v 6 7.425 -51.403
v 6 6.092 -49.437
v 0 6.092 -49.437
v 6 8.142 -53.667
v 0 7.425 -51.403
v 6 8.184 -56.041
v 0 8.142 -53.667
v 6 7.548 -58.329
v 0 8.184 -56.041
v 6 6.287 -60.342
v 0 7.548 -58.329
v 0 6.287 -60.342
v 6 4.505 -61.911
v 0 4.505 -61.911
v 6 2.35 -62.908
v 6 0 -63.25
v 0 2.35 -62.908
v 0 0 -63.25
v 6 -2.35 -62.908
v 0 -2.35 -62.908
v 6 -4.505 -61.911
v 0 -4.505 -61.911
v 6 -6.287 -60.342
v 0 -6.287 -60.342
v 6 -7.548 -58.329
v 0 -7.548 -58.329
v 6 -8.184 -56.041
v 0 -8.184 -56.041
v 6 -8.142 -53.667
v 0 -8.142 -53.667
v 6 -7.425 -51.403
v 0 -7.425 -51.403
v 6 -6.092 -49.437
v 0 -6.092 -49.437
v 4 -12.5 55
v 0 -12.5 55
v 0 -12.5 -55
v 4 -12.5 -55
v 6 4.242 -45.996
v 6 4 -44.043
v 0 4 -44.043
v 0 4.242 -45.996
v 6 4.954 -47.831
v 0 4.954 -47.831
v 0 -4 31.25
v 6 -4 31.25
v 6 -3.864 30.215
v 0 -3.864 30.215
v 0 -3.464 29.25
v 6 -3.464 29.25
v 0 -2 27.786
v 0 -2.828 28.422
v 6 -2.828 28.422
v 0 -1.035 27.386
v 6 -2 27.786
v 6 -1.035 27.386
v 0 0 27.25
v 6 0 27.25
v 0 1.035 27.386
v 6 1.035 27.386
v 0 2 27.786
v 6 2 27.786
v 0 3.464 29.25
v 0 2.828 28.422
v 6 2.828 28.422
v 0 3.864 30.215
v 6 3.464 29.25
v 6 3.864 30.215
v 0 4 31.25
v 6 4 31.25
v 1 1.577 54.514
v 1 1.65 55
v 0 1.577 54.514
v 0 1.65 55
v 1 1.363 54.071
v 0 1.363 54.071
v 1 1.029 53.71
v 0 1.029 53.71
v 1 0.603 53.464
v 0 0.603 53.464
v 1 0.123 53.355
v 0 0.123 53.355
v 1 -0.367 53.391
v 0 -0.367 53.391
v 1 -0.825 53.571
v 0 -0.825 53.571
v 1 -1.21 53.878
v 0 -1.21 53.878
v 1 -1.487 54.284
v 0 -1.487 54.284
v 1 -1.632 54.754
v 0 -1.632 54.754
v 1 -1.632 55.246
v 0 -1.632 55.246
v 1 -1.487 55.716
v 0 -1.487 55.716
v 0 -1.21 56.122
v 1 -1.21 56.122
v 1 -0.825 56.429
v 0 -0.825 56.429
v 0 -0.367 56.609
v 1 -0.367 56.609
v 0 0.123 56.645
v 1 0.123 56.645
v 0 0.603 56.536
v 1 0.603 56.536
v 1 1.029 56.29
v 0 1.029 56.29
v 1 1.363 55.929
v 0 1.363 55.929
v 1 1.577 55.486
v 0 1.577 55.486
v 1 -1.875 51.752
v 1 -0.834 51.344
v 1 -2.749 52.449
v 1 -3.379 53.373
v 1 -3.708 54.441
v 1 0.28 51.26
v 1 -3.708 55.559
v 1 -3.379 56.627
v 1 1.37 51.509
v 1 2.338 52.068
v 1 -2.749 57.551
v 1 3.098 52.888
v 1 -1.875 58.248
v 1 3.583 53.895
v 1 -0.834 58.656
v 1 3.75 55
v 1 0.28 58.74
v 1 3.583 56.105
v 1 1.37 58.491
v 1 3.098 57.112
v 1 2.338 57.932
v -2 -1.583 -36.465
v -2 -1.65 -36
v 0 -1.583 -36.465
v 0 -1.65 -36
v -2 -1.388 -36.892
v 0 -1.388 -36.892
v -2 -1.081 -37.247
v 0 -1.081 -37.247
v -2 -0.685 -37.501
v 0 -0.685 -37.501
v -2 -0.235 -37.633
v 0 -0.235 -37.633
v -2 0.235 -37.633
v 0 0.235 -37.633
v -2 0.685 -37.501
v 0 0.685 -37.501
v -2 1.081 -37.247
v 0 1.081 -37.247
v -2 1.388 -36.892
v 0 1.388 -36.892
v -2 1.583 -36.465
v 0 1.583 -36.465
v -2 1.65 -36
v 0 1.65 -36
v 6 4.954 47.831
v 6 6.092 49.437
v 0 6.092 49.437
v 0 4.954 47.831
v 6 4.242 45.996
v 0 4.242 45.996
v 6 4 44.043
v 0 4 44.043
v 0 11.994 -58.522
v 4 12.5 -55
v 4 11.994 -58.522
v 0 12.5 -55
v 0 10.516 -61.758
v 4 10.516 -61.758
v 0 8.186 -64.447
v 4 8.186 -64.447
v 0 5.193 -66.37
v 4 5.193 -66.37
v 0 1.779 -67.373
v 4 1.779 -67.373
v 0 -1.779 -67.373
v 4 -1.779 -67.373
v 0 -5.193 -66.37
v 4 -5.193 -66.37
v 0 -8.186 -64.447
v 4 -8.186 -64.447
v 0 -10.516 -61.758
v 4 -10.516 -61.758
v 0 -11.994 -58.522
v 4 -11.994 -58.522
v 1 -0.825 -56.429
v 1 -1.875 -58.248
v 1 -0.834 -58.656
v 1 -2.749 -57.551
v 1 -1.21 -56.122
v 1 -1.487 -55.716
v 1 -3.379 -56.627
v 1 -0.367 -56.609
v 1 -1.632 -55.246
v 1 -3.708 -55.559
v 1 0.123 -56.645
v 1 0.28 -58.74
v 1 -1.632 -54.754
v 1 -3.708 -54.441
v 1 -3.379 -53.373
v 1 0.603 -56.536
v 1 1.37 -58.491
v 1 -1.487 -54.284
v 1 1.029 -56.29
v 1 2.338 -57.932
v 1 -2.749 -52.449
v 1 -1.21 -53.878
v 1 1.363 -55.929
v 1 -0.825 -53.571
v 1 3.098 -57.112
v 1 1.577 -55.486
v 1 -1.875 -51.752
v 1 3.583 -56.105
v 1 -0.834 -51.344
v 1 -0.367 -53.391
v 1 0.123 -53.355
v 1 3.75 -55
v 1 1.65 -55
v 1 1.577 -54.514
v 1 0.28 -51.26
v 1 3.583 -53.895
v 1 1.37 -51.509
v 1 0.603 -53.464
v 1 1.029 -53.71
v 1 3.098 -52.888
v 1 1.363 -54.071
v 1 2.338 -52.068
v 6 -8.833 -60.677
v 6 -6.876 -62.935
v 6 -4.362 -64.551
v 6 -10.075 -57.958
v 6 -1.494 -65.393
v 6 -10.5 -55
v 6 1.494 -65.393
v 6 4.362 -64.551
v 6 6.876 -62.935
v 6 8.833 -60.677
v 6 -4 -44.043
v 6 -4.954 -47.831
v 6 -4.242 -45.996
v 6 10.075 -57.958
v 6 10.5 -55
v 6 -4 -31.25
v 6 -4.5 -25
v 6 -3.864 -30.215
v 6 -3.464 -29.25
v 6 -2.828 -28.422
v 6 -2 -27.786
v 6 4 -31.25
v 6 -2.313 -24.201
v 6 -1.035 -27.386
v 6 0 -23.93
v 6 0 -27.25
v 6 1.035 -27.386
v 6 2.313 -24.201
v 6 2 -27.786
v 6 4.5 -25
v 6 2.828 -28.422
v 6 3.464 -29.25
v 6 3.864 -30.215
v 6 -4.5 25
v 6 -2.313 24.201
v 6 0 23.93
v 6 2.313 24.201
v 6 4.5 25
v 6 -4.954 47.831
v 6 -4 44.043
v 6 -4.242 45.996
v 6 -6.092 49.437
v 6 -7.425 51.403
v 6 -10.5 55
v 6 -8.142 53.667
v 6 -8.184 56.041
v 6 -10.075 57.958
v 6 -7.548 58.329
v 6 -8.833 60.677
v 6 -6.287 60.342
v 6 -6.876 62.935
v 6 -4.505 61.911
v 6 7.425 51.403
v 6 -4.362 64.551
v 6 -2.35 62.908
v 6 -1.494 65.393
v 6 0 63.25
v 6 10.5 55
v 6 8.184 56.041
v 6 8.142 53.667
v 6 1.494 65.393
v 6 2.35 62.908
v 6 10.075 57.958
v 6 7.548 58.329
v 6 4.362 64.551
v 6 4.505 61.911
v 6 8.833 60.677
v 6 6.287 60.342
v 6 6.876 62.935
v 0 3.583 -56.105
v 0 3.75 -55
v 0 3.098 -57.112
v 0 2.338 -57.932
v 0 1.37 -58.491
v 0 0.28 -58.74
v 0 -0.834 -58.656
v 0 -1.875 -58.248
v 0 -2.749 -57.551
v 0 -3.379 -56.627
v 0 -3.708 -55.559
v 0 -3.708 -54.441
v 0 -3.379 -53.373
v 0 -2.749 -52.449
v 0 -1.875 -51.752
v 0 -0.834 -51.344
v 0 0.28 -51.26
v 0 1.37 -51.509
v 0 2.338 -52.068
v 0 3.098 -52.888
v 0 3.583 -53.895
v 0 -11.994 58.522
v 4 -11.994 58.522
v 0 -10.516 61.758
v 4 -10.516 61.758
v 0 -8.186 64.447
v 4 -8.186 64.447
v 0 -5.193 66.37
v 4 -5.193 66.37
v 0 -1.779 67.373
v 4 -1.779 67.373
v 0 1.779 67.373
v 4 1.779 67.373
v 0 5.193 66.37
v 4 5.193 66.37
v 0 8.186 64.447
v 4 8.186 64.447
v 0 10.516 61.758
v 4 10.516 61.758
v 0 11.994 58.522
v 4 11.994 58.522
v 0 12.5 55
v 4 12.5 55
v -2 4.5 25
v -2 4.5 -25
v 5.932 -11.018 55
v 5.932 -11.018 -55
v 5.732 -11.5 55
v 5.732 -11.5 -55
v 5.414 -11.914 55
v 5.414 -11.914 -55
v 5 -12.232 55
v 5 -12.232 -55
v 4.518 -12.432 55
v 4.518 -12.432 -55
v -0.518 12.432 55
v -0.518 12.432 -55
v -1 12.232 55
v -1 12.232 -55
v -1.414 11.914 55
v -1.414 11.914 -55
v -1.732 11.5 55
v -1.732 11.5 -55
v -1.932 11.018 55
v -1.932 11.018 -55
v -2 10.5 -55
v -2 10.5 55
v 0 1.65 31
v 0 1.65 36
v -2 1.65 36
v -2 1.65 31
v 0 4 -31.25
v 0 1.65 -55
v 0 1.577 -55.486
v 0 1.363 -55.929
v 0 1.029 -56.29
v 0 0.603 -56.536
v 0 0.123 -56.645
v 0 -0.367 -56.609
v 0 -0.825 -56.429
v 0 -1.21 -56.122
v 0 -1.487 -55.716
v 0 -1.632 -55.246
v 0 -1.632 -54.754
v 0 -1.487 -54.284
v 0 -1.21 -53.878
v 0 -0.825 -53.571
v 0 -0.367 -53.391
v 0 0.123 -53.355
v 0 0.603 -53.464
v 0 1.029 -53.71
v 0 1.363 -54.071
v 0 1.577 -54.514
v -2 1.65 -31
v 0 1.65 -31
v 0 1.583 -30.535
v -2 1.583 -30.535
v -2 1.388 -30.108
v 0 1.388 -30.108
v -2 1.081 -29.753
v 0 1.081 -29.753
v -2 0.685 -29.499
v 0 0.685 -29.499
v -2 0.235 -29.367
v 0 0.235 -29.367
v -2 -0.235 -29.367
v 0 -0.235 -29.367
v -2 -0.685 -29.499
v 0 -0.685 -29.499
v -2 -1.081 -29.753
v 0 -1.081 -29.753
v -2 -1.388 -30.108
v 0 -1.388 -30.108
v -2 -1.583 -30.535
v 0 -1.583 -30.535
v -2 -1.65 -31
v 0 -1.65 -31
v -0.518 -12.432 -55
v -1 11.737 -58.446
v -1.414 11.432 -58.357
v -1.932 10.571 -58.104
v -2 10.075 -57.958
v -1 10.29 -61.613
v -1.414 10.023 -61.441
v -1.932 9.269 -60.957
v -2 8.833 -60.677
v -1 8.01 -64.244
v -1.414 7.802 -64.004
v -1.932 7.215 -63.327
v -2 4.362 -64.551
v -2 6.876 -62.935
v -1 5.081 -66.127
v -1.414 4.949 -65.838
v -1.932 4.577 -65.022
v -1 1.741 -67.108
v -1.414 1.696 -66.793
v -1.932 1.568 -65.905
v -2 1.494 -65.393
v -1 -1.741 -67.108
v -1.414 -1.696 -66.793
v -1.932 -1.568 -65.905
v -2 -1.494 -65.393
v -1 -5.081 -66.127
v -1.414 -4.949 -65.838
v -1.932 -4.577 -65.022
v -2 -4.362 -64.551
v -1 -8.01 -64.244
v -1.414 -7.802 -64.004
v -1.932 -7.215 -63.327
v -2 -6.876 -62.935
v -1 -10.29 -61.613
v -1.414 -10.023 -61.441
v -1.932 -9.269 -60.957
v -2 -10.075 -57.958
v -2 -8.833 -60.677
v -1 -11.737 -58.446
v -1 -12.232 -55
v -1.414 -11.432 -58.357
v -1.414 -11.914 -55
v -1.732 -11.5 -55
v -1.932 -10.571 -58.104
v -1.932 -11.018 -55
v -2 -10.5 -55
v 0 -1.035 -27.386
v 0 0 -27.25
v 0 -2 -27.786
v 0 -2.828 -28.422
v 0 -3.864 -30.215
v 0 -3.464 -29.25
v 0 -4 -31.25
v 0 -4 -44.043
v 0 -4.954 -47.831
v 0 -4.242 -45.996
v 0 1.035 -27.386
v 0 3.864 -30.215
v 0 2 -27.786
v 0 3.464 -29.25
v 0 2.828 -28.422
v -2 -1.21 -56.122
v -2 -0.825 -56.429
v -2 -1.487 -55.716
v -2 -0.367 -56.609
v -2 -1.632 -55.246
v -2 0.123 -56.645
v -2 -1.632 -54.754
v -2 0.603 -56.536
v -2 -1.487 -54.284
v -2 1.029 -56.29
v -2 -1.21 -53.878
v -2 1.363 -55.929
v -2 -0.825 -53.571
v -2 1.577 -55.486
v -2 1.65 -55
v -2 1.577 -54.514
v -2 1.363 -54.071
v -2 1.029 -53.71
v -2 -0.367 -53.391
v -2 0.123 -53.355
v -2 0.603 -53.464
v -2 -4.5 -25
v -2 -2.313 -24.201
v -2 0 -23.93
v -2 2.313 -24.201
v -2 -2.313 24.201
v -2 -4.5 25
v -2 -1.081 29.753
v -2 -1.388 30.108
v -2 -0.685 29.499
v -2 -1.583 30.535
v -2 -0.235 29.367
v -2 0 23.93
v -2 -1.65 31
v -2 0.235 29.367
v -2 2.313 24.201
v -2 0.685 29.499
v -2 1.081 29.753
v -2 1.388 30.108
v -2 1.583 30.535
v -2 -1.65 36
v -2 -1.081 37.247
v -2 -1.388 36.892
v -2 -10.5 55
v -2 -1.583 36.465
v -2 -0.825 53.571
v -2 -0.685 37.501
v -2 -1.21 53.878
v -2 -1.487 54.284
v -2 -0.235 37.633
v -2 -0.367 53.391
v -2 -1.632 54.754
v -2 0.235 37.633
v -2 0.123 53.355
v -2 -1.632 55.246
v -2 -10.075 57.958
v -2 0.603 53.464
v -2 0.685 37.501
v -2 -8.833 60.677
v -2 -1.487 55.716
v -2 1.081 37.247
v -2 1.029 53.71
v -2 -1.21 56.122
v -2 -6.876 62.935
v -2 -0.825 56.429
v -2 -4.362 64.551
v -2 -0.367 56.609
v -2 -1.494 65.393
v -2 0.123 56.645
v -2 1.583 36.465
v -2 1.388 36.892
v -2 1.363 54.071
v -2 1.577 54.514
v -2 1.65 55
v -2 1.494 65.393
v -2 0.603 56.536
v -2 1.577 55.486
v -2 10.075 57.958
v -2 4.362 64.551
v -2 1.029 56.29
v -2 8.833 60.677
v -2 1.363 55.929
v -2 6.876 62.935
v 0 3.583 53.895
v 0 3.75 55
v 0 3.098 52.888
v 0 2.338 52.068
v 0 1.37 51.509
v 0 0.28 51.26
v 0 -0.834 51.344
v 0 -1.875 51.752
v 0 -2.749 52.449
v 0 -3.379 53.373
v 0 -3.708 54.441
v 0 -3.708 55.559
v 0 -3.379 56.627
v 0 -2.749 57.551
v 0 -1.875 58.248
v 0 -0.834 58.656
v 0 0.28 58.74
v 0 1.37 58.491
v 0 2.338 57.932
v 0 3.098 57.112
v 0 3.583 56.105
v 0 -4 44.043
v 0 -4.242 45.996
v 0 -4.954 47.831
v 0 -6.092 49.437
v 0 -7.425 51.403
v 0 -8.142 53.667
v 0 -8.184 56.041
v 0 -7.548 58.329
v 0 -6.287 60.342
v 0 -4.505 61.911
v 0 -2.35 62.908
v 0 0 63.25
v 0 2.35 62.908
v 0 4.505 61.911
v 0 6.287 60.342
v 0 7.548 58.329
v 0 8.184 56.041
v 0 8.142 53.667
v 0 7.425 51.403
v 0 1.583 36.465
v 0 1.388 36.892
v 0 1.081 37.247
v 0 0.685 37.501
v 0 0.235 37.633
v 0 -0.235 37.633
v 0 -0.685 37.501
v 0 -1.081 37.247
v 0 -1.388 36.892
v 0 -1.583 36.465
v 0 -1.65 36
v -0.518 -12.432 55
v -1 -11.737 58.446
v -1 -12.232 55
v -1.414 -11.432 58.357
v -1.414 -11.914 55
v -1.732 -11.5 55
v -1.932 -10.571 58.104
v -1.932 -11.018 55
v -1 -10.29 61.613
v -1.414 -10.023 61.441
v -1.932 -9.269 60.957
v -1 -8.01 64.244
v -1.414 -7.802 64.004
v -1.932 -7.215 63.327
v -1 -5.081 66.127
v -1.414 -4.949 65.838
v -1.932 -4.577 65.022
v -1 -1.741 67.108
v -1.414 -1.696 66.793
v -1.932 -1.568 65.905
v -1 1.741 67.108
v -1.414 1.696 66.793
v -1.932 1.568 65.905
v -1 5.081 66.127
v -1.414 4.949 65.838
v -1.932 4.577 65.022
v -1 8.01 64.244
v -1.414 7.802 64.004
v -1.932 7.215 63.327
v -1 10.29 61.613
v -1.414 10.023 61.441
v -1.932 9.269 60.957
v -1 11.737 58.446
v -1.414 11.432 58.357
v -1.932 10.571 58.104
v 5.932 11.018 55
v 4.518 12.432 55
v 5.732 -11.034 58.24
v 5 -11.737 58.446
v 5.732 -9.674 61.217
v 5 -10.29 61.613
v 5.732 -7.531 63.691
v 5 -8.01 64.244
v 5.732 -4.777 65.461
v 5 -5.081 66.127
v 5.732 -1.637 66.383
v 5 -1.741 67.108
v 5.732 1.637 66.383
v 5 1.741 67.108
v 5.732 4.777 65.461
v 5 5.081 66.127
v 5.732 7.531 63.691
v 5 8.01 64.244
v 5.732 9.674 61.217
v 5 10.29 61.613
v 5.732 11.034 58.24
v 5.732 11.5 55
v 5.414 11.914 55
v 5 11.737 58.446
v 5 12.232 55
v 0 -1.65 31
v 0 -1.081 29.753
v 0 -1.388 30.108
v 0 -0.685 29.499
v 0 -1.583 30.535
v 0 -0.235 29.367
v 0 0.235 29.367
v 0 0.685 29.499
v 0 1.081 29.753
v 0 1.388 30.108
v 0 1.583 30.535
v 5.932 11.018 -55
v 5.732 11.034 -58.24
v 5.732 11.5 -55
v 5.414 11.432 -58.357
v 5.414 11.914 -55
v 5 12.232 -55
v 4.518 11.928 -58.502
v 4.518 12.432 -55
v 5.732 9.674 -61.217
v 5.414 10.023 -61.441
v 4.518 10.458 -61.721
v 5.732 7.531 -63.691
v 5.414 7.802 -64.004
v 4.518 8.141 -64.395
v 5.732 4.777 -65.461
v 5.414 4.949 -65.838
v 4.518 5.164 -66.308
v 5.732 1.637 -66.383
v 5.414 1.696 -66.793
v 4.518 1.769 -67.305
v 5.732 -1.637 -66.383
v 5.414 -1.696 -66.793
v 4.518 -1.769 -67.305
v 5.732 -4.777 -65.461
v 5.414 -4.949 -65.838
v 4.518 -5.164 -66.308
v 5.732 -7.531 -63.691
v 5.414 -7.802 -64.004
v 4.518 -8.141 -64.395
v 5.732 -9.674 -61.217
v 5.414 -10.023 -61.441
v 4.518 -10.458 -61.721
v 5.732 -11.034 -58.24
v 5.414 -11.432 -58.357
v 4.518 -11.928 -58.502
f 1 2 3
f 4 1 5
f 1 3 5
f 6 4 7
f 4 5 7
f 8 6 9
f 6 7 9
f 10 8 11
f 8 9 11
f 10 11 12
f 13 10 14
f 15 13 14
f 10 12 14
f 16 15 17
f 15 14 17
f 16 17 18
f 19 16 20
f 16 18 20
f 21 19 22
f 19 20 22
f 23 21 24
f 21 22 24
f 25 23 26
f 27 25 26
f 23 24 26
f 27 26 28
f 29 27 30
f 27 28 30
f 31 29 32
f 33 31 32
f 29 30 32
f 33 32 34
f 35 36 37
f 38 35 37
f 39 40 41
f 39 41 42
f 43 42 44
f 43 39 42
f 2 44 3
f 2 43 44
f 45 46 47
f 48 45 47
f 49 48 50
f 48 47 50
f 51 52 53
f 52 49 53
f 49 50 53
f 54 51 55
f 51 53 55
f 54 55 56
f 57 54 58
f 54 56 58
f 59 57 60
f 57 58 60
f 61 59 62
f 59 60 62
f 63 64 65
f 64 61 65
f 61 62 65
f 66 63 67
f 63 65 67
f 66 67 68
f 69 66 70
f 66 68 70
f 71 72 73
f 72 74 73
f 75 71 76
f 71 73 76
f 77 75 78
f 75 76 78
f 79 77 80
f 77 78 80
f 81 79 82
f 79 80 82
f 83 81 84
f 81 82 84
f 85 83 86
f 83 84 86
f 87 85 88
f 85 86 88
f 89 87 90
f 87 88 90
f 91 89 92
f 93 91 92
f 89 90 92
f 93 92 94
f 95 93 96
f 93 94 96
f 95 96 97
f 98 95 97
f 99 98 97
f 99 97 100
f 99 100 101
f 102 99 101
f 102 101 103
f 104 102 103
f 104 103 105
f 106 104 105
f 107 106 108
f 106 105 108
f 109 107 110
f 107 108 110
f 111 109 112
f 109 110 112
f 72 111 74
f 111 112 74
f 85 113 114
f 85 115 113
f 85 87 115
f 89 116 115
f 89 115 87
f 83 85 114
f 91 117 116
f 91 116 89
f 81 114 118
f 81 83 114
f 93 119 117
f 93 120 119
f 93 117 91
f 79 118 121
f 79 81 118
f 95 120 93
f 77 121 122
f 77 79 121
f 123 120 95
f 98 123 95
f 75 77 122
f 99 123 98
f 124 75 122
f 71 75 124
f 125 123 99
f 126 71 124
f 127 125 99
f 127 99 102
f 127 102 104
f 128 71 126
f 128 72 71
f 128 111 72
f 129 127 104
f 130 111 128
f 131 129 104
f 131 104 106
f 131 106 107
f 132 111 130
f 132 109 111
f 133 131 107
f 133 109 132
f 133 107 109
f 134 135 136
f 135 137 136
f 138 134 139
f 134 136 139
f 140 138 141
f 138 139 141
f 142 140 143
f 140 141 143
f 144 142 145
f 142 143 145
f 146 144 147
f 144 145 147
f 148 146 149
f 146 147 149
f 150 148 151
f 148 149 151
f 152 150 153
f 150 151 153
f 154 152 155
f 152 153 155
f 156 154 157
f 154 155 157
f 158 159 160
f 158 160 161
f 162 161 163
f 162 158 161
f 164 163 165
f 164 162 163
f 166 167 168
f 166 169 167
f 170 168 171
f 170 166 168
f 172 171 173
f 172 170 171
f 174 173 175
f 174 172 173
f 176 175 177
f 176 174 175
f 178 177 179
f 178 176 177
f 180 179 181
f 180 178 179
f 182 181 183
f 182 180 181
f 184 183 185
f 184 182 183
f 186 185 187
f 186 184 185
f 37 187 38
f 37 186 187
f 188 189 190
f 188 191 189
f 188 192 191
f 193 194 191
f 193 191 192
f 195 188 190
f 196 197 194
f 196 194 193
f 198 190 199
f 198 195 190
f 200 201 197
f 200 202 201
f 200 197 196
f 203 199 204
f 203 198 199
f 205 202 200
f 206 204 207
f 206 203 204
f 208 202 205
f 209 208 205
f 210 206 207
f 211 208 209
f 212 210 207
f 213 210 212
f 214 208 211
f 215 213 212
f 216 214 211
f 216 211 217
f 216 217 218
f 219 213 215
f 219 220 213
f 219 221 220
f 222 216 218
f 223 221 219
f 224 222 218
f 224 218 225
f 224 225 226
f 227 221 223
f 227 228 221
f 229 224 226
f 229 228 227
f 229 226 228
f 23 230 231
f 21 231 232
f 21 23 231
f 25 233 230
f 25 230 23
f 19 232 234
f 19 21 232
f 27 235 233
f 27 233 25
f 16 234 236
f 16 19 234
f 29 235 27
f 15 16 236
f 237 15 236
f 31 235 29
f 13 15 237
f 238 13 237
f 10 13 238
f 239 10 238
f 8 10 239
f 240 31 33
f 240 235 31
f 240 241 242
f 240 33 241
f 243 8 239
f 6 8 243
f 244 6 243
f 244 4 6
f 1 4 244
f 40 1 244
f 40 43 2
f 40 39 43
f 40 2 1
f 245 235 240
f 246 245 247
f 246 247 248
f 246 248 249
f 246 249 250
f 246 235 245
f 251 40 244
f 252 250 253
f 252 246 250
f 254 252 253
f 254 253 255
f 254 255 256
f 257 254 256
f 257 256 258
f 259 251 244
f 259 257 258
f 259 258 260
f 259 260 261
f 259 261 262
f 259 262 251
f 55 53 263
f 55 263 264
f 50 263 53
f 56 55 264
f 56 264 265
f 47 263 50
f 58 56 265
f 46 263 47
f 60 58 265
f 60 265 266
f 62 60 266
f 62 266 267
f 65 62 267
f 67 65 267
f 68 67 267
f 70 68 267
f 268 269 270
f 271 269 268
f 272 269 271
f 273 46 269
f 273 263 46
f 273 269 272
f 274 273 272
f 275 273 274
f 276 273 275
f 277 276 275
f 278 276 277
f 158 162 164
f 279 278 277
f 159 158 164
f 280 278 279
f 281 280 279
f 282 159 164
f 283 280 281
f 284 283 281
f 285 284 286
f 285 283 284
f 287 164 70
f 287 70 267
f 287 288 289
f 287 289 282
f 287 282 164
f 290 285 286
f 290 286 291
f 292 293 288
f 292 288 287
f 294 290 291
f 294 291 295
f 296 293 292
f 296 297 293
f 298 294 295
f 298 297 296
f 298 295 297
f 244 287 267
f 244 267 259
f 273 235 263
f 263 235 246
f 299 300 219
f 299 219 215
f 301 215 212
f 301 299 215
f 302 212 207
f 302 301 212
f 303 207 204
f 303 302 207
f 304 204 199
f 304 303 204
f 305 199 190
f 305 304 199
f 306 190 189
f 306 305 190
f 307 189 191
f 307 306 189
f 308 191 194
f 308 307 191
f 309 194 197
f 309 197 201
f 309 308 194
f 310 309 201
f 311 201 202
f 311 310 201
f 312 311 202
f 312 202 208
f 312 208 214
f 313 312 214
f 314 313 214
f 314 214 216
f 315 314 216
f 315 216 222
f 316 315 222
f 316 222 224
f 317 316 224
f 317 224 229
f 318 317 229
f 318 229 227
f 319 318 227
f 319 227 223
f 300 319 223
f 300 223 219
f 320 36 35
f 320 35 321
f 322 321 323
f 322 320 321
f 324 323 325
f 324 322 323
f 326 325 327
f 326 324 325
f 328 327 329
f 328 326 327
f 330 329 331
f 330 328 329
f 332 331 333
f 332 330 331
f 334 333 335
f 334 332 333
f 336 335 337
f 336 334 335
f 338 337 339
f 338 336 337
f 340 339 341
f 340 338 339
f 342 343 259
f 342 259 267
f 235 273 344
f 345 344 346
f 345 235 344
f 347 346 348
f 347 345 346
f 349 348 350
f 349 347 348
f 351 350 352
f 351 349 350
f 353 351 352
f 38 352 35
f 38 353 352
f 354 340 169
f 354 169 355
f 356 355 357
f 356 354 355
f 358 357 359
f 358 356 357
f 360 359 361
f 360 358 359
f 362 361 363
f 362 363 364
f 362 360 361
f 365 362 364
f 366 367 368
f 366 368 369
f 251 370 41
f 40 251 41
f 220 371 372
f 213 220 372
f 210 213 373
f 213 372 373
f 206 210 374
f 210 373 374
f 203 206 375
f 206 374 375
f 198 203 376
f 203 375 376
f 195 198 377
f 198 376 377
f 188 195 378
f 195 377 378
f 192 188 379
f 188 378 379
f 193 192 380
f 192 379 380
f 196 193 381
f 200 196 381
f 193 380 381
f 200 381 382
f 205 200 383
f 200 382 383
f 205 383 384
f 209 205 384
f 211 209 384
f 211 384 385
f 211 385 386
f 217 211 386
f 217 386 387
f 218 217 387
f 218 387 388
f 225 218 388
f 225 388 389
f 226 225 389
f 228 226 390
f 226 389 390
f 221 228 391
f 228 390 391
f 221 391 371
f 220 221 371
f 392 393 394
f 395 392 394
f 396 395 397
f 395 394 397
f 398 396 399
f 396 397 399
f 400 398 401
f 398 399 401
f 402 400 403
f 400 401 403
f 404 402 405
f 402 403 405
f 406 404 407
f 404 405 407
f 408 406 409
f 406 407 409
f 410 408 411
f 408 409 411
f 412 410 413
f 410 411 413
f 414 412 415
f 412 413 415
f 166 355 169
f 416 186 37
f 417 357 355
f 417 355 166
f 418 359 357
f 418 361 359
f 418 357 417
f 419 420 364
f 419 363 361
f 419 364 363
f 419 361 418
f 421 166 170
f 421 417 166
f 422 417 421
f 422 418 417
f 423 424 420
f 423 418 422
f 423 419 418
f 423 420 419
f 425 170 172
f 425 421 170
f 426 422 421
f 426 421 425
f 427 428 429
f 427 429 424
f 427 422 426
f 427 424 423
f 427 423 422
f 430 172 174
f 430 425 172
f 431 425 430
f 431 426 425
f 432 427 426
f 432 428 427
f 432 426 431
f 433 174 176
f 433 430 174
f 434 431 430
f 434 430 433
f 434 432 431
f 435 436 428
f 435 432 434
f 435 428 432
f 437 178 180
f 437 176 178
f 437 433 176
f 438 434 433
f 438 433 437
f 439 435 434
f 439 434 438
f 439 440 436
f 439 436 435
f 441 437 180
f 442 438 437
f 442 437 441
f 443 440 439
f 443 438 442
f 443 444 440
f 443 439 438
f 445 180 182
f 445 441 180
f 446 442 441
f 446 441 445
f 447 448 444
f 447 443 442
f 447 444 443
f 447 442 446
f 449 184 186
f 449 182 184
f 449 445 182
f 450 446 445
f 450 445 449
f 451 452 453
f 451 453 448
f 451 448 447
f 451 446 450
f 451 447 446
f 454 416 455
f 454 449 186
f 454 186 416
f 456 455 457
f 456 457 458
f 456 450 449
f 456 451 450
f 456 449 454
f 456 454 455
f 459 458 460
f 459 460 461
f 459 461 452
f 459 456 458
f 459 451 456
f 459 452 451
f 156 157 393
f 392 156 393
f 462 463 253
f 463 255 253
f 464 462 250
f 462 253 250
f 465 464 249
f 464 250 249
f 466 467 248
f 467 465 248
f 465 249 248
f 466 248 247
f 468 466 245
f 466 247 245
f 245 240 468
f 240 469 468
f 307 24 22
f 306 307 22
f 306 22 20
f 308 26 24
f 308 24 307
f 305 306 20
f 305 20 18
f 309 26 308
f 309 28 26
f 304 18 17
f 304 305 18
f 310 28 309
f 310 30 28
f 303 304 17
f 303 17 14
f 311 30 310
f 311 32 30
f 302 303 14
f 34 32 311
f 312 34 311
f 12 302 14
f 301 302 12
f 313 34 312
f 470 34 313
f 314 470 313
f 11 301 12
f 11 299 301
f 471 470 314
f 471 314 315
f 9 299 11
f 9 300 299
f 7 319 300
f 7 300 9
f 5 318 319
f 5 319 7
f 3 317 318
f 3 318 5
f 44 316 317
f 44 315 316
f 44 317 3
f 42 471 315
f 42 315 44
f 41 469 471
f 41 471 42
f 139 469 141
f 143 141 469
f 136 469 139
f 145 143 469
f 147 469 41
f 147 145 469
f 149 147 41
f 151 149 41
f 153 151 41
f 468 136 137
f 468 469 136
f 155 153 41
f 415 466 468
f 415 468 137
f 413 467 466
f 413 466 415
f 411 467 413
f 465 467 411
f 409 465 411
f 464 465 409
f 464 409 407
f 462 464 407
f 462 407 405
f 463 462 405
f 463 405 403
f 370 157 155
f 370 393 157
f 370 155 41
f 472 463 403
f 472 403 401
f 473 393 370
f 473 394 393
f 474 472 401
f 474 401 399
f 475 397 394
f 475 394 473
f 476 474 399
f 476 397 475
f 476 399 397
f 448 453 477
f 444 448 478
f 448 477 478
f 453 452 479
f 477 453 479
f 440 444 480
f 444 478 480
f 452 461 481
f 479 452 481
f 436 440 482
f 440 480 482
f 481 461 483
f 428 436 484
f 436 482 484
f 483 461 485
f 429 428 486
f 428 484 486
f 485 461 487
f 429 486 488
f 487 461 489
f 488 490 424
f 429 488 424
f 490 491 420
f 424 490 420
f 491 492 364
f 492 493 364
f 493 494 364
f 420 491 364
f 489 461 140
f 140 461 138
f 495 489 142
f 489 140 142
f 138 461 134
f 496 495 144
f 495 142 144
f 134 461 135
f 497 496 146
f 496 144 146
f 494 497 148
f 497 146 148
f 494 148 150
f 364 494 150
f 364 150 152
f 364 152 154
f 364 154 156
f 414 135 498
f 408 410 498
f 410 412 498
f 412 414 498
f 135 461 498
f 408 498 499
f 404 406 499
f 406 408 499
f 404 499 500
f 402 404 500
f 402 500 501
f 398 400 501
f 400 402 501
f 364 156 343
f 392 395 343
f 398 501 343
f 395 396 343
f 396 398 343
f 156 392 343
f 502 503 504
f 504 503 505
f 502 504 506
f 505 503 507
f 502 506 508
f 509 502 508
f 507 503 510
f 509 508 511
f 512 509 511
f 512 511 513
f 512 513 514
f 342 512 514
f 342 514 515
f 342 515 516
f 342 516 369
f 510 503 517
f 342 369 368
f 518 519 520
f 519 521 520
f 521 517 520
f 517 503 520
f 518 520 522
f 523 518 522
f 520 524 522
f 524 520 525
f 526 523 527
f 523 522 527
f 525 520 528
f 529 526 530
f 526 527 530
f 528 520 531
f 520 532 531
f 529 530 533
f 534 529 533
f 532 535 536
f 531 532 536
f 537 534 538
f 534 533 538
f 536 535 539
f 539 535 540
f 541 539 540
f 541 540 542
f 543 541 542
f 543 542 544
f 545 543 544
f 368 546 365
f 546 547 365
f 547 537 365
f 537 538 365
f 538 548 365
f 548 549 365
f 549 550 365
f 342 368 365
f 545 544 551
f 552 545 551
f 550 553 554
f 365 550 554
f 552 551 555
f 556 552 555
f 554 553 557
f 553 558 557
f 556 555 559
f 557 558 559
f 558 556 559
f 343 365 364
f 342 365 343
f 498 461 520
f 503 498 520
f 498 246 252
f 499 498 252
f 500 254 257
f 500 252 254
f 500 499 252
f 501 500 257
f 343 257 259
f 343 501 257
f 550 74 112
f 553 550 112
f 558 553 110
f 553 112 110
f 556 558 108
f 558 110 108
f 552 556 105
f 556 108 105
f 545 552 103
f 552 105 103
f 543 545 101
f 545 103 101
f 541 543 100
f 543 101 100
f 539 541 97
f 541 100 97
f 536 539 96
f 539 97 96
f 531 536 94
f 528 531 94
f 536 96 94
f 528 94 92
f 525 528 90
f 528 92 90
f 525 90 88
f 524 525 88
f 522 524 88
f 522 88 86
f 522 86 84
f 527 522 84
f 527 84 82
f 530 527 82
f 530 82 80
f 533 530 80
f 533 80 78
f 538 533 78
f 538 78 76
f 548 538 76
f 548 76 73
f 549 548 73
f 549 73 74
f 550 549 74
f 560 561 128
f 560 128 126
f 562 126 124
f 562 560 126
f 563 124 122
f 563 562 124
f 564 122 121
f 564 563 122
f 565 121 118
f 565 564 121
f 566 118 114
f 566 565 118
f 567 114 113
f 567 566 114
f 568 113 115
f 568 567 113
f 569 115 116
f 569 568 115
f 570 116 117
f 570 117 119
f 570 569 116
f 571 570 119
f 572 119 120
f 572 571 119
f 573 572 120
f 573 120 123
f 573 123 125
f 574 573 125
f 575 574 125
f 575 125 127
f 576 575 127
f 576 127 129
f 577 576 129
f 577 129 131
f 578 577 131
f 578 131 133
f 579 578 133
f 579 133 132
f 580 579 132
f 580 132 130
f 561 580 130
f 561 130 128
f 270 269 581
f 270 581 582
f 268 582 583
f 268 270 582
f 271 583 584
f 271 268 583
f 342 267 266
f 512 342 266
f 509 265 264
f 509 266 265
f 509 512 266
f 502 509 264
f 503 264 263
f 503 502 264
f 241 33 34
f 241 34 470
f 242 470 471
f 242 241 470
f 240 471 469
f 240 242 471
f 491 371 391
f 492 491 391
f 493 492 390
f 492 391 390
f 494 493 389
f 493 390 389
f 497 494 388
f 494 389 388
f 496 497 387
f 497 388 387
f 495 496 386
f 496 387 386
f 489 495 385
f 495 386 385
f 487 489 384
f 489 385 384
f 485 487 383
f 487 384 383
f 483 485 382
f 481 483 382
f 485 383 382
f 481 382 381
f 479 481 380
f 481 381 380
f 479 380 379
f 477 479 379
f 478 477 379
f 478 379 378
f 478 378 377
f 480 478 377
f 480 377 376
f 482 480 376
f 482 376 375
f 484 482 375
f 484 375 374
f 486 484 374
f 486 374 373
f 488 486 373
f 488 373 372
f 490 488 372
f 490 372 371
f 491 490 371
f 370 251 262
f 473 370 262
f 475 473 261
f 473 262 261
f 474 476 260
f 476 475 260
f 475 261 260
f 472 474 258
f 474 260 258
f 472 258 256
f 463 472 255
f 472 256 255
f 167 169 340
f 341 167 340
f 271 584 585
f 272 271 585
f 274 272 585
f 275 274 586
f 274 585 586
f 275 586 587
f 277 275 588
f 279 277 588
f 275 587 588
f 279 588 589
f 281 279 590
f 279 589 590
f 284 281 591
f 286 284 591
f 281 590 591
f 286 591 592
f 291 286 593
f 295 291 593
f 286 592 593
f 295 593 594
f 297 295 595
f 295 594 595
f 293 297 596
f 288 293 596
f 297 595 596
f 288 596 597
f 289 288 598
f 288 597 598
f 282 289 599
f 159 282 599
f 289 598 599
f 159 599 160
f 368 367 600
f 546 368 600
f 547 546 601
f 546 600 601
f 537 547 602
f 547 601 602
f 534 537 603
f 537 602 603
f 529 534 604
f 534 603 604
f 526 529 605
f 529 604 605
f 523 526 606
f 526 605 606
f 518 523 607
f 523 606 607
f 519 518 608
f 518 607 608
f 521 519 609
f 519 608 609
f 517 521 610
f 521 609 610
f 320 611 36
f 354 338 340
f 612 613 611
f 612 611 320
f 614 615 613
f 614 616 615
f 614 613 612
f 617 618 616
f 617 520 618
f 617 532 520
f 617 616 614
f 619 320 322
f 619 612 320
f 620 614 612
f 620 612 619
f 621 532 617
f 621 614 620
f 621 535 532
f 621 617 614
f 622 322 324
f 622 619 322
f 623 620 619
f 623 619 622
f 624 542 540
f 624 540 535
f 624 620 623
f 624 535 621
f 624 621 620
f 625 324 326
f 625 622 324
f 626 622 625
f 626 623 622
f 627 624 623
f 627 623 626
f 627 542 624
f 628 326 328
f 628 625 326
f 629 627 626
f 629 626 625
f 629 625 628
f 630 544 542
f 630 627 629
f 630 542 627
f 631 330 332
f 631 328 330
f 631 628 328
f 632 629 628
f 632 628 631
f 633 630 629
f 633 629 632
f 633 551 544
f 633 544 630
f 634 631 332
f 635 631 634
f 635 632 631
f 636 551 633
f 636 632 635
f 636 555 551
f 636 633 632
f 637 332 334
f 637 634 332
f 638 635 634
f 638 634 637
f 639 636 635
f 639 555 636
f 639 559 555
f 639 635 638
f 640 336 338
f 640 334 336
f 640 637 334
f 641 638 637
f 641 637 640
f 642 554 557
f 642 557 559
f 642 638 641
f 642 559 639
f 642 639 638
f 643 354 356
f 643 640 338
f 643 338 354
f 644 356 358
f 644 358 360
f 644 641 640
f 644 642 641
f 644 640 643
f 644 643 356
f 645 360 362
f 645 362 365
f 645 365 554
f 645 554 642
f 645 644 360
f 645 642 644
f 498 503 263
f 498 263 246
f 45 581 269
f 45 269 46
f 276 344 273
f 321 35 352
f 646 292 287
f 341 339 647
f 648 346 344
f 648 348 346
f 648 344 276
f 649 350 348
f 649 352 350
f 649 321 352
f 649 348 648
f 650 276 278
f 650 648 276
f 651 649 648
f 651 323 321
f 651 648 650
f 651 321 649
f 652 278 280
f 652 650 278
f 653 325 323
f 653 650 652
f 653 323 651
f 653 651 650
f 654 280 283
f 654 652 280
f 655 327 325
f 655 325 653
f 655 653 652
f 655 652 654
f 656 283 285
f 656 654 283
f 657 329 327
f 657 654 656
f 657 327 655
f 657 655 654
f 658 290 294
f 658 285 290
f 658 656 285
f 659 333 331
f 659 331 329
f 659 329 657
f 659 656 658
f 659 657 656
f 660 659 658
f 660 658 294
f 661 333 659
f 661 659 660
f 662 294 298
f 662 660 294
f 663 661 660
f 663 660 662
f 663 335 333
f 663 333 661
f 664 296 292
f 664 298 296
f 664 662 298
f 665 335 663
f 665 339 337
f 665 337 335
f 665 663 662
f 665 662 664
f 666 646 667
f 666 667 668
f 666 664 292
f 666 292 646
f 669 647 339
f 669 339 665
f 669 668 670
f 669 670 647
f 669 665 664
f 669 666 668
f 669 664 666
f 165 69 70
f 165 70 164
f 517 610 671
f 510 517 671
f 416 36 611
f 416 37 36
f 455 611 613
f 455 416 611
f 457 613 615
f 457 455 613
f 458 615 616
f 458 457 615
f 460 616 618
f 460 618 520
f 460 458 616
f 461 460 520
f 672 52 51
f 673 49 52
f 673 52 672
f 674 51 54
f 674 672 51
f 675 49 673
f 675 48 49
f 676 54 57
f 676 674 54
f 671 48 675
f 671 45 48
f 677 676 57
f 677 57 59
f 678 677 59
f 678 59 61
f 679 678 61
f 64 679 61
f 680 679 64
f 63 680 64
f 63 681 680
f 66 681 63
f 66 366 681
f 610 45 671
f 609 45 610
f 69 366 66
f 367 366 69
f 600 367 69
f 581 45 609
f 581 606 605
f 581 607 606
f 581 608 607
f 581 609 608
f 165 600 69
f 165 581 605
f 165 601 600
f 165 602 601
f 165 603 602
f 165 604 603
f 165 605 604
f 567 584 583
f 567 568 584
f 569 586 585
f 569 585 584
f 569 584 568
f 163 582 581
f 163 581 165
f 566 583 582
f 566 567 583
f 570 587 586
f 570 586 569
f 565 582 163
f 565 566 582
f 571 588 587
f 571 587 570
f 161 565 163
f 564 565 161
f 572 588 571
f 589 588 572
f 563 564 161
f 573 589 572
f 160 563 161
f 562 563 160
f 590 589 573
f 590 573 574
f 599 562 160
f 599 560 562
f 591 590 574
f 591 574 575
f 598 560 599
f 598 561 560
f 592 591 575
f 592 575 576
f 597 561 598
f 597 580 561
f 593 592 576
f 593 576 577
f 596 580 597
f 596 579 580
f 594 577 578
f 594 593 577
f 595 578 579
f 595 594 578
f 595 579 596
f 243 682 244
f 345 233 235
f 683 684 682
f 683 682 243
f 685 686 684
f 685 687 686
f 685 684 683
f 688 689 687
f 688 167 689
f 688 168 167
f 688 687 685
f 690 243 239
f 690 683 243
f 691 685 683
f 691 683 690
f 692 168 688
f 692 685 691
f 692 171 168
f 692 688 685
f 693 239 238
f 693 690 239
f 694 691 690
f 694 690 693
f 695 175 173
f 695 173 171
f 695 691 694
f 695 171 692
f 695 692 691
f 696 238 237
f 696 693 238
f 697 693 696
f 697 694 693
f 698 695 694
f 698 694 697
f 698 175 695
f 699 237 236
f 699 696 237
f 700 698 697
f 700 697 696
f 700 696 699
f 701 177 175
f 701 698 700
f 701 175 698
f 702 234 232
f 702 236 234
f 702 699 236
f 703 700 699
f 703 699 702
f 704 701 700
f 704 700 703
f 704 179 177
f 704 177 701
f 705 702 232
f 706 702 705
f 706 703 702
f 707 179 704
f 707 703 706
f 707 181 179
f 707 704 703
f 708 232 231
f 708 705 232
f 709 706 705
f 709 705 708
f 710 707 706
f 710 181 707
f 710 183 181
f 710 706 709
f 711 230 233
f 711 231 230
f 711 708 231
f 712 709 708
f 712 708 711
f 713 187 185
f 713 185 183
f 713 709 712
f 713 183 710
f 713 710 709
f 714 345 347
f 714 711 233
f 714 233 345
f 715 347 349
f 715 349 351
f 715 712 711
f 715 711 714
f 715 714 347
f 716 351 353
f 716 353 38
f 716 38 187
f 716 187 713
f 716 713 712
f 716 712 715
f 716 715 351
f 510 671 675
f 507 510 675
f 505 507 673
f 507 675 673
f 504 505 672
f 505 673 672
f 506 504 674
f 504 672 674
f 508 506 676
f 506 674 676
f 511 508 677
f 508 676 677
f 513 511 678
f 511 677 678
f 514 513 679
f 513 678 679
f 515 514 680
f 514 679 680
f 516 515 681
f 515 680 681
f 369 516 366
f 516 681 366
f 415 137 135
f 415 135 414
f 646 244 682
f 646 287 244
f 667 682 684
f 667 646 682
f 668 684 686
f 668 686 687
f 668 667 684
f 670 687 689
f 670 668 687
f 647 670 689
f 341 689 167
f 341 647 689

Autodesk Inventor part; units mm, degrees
ref_plane "YZ Plane" through (0, 0, 0) normal (1, 0, 0) x (0, 1, 0)
ref_plane "XZ Plane" through (0, 0, 0) normal (0, 1, 0) x (-1, 0, 0)
ref_plane "XY Plane" through (0, 0, 0) normal (0, 0, 1) x (1, 0, 0)
sketch "Sketch1" plane through (0, 0, 0) normal (1, 0, 0) x (0, 1, 0)
  line L0 (12.5, 55) -> (-12.5, 55)
  line L1 (-12.5, 55) -> (-12.5, -55)
  line L2 (-12.5, -55) -> (12.5, -55)
  line L3 (12.5, -55) -> (12.5, 55)
  arc A0 (12.5, 55) -> (-12.5, 55) centre (0, 55) ccw
  arc A1 (-12.5, -55) -> (12.5, -55) centre (0, -55) ccw
  circle A2 centre (0, 55) radius 1.65
  circle A3 centre (0, 55) radius 3.75
  circle A4 centre (0, 55) radius 8.25
  line L4 (4, 55) -> (-4, 55)
  line L5 (-4, 55) -> (-4, 27.25)
  line L6 (-4, 27.25) -> (4, 27.25)
  line L7 (4, 27.25) -> (4, 55)
  circle A5 centre (0, 31) radius 1.65
  circle A6 centre (0, 36) radius 1.65
  line L8 (1.65, 36) -> (1.65, 31)
  line L9 (-1.65, 36) -> (-1.65, 31)
  line L10 (12.5, 0) -> (-12.5, 0) construction
  circle A7 centre (0, -55) radius 1.65
  circle A8 centre (0, -55) radius 3.75
  circle A9 centre (0, -55) radius 8.25
  line L11 (-4, -55) -> (-4, -27.25)
  line L12 (-4, -27.25) -> (4, -27.25)
  line L13 (4, -27.25) -> (4, -55)
  circle A10 centre (0, -31) radius 1.65
  circle A11 centre (0, -36) radius 1.65
  line L14 (1.65, -36) -> (1.65, -31)
  line L15 (-1.65, -36) -> (-1.65, -31)
  line L16 (4.5, 25) -> (-4.5, 25)
  line L17 (-4.5, 25) -> (-4.5, -25)
  line L18 (-4.5, -25) -> (4.5, -25)
  line L19 (4.5, -25) -> (4.5, 25)
  line L20 (4.5, 25) -> (-4.5, -25) construction
  line L21 (-4.5, 25) -> (4.5, -25) construction
  arc A12 (-4.5, 25) -> (4.5, 25) centre (0, 33.9303) ccw
  arc A13 (4.5, -25) -> (-4.5, -25) centre (0, -33.9303) ccw
  point P0 (0, 0)
  point P1 (0, 55)
  point P2 (-4, -47.7846)
  point P3 (4, -47.7846)
  point P4 (4, 47.7846)
  point P5 (-4, 47.7846)
  point P6 (0, 0)
  point P7 (3.75, 55)
  point P8 (-3.75, 55)
  dimension "d0" = 110
  dimension "d1" = 55
  dimension "d2" = 12.5
  dimension "d3" = 25
  dimension "d4" = 3.3
  dimension "d5" = 7.5
  dimension "d6" = 16.5
  dimension "d7" = 8
  dimension "d8" = 4
  dimension "d10" = 36
  dimension "d11" = 3.3
  dimension "d12" = 24
  dimension "d13" = 4
  dimension "d14" = 3.3
  dimension "d15" = 5
  dimension "d16" = 4
  dimension "d34" = 50
  dimension "d35" = 8
  dimension "d36" = 8
  dimension "d37" = 10
  dimension "d38" = 10
extrude "Extrusion1" add sketch "Sketch1" along normal blind 6 contours L3 L2 A9 L13 L12 L11 L1 L0 A4 L5 L6 L7 | L0 A4 A0 | A1 L2 A9 | A12 L16 | L18 A13
extrude "Extrusion2" add sketch "Sketch1" against normal blind 2 contours L3 L2 A9 L13 L12 L11 L1 L0 A4 L5 L6 L7 | L0 A4 A0 | A4 L7 L0 | L0 A3 A4 | A1 L2 A9 | L7 A4 L5 L0 A3 | L0 L5 A4 | L7 L6 L5 A4 | A9 L2 A8 | L2 L13 A9 | A3 L0 A2 | L0 A2 A3 | L2 A8 L11 A9 L13 | A9 L11 L12 L13 | A9 L11 L2 | A8 L2 A7 | L2 A7 A8 | A12 L16 | L18 A13
extrude "Extrusion3" add sketch "Sketch1" along normal blind 1 contours A3 L0 A2 | L0 A2 A3 | A8 L2 A7 | L2 A7 A8
fillet "Fillet1" radius 4 4 edges at (3, -4, 27.25) (3, 4, 27.25) (3, -4, -27.25) (3, 4, -27.25)
fillet "Fillet2" radius 8 4 edges at (3, -4, -47.7846) (3, 4, -47.7846) (3, -4, 47.7846) (3, 4, 47.7846)
fillet "Fillet3" radius 2 8 edges at (6, 0, 67.5) (6, -12.5, 0) (6, 0, -67.5) (6, 12.5, 0) (-2, 0, -67.5) (-2, -12.5, 0) (-2, 0, 67.5) (-2, 12.5, 0)
equation "\"d0\" = FEMUR_LENGTH"
equation "\"d1\" = 0.5 * FEMUR_LENGTH"
equation "\"d2\" = 0.5 * FEMUR_WIDTH"
equation "\"d3\" = FEMUR_WIDTH"
equation "\"d4\" = HornScrewDiameter"
equation "\"d5\" = HornCentreDiameter"
equation "\"d6\" = HornDiameter"
equation "\"d7\" = HornWidth"
equation "\"d8\" = 0.5 * HornWidth"
equation "\"d10\" = HornLength"
equation "\"d11\" = HornScrewDiameter"
equation "\"d12\" = HornScrewX"
equation "\"d13\" = 0.5 * HornWidth"
equation "\"d14\" = HornScrewDiameter"
equation "\"d15\" = HornScrewLen"
equation "\"d16\" = 0.5 * HornWidth"
equation "\"d17\" = HornHeight"
equation "\"d19\" = FEMUR_HEIGHT - HornHeight"
equation "\"d21\" = HornCentreHeight"
equation "\"d23\" = 0.5 * HornWidth"
equation "\"d24\" = HornFillet"
equation "\"d25\" = PART_FILLET"
equation "\"FEMUR_LENGTH\" = 110"
equation "\"FEMUR_WIDTH\" = 25"
equation "\"HornScrewDiameter\" = 3.3"
equation "\"HornCentreDiameter\" = 7.5"
equation "\"HornDiameter\" = 16.5"
equation "\"HornWidth\" = 8"
equation "\"HornLength\" = 36"
equation "\"HornScrewLen\" = 5"
equation "\"HornHeight\" = 6"
equation "\"FEMUR_HEIGHT\" = 8"
equation "\"HornCentreHeight\" = 1"
equation "\"HornFillet\" = 8"
equation "\"PART_FILLET\" = 2"
equation "\"HornScrewX\" = 24"
properties part number "FemurHornSide"
